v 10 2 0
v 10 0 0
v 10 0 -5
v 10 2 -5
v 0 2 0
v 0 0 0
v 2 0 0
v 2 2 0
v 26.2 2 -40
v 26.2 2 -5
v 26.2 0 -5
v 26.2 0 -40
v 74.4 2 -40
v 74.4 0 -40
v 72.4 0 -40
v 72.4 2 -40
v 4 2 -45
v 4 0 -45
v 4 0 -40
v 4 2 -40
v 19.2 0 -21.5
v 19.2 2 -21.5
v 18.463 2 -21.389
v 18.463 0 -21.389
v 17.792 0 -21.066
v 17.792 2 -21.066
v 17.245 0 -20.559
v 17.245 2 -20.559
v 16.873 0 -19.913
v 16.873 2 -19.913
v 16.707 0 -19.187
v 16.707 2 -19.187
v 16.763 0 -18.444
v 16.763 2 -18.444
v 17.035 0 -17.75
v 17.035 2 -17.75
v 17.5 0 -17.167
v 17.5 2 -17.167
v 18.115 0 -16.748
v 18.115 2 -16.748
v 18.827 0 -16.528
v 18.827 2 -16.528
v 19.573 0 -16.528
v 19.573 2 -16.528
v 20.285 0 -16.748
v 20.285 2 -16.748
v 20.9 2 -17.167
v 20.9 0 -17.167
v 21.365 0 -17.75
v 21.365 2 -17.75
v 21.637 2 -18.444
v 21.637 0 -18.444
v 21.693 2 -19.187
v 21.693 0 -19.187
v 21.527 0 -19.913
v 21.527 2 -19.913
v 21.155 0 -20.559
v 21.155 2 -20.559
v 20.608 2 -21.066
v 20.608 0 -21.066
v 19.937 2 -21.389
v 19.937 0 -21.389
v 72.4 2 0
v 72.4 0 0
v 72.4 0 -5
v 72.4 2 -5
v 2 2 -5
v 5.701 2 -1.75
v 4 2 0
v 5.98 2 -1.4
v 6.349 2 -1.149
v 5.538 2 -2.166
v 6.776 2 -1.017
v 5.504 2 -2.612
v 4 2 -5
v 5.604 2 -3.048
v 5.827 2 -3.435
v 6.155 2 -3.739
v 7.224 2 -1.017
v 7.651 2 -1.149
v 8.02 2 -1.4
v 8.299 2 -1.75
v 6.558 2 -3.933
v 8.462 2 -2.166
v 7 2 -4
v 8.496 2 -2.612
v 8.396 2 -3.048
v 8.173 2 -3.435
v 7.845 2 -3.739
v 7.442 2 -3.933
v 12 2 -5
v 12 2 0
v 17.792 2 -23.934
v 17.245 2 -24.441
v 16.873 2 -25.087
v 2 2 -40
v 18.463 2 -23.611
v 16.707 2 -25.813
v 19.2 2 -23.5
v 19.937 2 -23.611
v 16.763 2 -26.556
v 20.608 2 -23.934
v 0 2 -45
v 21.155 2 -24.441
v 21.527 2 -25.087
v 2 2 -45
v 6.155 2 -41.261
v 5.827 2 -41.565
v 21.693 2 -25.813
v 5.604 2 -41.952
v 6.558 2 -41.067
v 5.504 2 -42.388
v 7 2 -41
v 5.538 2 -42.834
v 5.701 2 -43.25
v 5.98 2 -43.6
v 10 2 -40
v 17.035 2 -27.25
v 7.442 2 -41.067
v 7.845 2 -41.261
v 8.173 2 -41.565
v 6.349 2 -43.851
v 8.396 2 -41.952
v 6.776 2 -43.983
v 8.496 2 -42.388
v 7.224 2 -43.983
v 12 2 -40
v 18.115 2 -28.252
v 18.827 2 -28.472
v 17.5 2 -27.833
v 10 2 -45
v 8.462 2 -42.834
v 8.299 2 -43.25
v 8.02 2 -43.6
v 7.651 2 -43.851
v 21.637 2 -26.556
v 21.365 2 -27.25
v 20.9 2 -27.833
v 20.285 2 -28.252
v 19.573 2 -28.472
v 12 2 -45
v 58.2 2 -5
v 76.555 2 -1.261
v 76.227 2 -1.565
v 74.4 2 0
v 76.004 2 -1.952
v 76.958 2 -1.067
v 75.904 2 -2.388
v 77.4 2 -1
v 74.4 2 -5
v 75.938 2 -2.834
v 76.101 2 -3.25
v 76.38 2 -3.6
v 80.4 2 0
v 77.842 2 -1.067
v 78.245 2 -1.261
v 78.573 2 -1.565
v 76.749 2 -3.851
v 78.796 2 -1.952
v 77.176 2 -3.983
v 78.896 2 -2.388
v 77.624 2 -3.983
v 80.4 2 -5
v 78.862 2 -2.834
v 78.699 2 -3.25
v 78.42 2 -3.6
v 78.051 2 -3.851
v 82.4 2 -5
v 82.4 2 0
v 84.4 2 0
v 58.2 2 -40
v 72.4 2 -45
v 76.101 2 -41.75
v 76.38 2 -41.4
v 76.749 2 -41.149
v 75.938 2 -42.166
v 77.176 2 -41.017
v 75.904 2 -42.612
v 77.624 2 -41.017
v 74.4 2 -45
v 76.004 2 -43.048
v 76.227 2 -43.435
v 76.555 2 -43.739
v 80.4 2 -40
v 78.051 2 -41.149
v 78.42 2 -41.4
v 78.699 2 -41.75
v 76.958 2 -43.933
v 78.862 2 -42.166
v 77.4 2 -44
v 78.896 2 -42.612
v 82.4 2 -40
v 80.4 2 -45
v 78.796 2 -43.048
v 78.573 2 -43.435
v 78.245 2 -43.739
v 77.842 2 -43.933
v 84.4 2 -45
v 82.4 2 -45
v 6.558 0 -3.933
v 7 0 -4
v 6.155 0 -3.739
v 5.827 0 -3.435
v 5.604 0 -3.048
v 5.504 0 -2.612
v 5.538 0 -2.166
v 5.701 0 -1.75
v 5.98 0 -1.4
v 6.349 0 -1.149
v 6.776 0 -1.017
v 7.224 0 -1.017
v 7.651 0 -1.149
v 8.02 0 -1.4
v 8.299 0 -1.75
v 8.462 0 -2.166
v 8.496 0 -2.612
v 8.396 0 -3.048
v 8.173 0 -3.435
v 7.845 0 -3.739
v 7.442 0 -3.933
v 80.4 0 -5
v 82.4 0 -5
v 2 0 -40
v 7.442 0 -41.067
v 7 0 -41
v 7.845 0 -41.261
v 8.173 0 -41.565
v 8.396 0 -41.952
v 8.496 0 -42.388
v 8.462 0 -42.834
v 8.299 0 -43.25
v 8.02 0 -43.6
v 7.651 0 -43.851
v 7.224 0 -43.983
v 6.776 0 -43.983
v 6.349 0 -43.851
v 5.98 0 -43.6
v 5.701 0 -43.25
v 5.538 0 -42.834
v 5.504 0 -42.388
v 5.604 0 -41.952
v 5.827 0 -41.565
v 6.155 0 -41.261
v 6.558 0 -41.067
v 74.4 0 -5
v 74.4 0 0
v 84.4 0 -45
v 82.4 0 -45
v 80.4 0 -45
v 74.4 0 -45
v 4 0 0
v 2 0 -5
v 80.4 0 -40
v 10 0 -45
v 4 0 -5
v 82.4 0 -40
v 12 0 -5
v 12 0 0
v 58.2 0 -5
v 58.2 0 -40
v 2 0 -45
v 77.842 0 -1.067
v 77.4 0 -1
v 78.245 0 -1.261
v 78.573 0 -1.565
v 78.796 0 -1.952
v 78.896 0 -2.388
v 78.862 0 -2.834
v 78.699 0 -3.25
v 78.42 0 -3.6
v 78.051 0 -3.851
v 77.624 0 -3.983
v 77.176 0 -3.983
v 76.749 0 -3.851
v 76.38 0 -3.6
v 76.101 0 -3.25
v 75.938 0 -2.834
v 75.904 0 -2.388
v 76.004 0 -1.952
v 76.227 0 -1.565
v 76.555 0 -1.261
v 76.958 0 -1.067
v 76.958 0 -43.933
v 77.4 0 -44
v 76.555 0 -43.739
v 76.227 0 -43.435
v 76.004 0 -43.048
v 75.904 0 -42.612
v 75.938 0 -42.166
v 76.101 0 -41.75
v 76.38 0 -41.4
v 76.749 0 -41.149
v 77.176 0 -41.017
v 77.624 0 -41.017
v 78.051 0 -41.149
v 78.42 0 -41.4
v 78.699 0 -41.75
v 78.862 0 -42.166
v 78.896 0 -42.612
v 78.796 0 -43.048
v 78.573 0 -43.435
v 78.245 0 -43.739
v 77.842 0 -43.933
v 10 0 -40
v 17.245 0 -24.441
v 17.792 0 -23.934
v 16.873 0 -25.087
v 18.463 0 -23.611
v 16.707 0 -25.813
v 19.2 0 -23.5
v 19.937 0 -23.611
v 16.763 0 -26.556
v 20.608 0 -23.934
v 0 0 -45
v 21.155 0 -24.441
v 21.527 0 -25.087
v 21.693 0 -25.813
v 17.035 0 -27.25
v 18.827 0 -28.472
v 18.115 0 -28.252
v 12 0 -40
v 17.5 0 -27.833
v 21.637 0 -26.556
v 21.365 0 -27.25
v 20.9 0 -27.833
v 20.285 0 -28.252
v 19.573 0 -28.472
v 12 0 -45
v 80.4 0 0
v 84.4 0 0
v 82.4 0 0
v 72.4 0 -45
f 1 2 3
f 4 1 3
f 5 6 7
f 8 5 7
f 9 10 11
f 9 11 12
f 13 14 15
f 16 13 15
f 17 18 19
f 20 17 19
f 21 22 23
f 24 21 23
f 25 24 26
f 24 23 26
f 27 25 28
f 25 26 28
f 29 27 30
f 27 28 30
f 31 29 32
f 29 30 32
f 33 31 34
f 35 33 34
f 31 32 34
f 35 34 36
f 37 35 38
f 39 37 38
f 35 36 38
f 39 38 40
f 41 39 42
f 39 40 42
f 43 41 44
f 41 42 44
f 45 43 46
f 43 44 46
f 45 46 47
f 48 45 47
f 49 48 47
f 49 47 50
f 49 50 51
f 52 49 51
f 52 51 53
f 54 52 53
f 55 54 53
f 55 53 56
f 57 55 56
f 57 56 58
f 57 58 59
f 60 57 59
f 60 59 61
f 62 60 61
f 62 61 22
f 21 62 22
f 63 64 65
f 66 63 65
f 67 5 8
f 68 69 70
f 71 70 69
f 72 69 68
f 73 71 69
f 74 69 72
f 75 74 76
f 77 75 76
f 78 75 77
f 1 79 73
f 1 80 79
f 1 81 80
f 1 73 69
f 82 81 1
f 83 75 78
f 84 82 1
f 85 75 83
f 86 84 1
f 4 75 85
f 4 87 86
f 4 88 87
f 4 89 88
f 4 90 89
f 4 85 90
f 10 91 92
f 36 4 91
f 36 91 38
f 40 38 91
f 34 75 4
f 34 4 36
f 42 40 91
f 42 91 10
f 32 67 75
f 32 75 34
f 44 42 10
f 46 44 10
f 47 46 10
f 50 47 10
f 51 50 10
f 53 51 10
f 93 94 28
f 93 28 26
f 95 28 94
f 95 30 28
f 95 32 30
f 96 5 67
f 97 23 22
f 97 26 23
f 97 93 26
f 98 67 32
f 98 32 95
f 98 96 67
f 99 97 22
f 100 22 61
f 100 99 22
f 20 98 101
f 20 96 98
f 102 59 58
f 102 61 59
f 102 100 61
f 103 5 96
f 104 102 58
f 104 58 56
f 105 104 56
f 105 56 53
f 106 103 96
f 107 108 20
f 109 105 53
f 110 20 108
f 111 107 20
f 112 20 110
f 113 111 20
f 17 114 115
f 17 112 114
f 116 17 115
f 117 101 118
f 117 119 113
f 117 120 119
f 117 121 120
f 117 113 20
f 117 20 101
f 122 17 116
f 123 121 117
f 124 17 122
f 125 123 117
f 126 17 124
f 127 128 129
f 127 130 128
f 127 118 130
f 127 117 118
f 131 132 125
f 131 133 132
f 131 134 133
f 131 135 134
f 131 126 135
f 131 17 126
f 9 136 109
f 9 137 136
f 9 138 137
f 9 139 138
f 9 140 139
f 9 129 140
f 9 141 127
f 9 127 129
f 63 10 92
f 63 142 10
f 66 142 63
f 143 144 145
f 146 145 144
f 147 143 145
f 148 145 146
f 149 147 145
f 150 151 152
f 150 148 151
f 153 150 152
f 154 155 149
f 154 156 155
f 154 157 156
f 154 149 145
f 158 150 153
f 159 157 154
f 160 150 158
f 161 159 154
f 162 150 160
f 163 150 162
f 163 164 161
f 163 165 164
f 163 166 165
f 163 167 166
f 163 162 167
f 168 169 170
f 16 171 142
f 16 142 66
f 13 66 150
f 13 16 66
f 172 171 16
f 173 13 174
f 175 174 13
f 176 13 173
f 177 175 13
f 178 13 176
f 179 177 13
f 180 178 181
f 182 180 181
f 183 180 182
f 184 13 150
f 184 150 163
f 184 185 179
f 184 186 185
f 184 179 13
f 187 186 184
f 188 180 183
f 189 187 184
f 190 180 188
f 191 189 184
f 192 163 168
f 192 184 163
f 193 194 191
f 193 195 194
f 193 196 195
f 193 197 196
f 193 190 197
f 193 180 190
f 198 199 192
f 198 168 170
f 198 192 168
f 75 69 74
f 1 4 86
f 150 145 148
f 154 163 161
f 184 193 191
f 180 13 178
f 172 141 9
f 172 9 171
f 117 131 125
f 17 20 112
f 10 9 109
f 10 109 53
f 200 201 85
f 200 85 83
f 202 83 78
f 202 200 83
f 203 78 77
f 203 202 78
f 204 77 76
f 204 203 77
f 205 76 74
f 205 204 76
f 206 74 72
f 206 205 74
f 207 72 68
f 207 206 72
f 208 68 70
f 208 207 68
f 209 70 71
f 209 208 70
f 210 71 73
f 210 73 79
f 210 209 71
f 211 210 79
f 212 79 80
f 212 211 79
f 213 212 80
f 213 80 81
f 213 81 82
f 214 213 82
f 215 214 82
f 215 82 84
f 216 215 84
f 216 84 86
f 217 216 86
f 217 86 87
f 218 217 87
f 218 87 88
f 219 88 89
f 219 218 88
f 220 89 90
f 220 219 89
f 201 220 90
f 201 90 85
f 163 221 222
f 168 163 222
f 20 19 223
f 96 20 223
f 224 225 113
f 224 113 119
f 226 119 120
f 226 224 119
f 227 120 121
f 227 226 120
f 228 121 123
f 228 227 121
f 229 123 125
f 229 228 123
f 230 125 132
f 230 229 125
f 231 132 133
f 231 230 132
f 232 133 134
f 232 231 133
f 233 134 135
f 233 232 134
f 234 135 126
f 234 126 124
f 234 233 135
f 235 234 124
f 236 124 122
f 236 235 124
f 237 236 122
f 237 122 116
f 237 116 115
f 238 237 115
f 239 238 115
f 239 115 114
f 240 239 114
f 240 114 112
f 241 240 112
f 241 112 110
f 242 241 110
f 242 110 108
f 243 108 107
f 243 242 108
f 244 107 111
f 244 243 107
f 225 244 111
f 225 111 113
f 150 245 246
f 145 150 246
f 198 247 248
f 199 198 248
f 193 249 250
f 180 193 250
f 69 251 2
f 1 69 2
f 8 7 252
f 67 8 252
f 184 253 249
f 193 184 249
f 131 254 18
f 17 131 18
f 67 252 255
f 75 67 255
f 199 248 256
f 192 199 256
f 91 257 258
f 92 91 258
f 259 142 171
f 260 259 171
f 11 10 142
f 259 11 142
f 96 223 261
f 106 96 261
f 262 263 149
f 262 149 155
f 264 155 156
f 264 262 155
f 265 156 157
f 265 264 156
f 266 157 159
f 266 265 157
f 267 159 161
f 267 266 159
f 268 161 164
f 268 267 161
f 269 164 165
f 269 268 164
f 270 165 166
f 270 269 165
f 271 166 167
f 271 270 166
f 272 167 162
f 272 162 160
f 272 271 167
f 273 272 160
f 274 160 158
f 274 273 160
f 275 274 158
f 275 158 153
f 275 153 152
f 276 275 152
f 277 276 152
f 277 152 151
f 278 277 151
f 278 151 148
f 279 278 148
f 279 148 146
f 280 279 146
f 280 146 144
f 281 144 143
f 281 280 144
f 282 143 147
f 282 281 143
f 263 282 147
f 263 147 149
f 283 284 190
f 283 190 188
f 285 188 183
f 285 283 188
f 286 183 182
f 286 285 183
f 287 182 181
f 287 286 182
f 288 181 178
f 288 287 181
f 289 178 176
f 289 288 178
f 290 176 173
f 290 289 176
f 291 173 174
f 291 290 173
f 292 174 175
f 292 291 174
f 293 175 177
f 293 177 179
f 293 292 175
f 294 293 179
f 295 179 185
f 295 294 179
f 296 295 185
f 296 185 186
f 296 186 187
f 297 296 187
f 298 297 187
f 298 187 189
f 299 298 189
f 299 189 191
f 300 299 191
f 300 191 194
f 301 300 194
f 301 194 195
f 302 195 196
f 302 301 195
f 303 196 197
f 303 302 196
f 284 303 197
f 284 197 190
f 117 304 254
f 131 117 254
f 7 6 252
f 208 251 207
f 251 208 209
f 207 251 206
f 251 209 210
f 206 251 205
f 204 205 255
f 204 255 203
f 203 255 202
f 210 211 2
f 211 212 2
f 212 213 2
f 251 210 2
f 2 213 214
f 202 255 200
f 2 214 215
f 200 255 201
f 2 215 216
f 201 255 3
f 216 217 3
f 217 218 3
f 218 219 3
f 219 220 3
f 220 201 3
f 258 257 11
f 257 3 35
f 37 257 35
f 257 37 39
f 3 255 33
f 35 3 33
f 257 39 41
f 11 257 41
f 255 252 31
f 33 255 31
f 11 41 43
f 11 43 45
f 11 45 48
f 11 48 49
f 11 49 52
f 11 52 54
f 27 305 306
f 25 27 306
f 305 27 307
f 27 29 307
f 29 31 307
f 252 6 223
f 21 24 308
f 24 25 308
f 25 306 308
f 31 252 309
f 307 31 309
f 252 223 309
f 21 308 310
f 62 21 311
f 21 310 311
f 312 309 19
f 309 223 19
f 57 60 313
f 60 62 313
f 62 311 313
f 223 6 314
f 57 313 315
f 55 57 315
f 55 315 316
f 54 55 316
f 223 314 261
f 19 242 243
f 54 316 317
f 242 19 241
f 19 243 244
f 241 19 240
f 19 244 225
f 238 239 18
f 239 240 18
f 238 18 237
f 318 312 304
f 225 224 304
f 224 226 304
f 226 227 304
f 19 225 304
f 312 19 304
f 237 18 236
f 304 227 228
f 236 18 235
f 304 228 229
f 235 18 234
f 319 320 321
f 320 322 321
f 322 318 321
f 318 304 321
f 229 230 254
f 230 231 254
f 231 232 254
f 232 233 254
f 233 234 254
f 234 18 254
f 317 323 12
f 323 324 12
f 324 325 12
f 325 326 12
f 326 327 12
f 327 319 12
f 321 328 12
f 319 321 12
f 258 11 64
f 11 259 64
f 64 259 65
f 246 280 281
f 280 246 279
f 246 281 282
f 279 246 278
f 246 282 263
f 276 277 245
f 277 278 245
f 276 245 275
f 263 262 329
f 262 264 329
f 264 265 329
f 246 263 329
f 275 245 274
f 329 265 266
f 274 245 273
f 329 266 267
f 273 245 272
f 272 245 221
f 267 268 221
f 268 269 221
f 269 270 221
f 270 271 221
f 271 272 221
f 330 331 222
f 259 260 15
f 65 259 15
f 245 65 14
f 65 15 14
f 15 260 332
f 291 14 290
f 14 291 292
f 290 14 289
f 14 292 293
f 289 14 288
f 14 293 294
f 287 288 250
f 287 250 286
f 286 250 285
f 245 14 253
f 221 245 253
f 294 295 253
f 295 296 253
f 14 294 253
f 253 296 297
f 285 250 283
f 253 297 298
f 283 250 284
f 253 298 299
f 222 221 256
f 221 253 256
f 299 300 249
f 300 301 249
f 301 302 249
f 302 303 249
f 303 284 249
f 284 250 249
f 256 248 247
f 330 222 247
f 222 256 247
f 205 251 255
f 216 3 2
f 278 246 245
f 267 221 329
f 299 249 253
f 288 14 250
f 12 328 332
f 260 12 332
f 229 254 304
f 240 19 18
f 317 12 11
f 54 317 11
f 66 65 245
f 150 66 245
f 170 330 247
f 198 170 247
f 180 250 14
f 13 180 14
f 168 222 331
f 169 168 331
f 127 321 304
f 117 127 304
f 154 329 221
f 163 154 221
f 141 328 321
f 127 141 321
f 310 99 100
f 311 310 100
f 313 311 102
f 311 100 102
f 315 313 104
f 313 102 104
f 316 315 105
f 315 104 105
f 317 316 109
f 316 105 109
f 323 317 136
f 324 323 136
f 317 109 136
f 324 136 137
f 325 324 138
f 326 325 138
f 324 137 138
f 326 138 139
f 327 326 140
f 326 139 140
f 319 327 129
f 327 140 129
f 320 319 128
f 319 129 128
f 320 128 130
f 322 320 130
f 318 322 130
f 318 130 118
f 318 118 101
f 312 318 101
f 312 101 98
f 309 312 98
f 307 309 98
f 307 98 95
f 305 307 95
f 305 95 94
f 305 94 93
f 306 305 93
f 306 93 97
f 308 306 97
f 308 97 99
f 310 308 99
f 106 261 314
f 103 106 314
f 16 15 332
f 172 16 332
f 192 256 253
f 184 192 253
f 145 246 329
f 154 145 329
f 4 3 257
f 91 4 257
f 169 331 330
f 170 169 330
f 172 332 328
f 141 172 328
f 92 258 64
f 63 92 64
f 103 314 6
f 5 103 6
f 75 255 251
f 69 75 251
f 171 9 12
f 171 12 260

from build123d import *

# Parameters (mm, degrees)
SKETCH1_R           = 1.5
BOSS_EXTRUDE1_DEPTH = 2
SKETCH2_W           = 32
SKETCH2_H           = 35
CUT_EXTRUDE1_DEPTH  = 10
SKETCH3_R           = 2.5
CUT_EXTRUDE2_DEPTH  = 10


with BuildPart() as part:
    # Sketch1 → Boss-Extrude1 (new body)
    with BuildSketch(Plane(origin=(0, 0, 0), x_dir=(1, 0, 0), z_dir=(0, 1, 0))):
        Polygon((0, 0), (2, 0), (2, 5), (4, 5), (4, 0), (10, 0), (10, 5), (12, 5), (12, 0), (72.4, 0), (72.4, 5), (74.4, 5), (74.4, 0), (80.4, 0), (80.4, 5), (82.4, 5), (82.4, 0), (84.4, 0), (84.4, 45), (82.4, 45), (82.4, 40), (80.4, 40), (80.4, 45), (74.4, 45), (74.4, 40), (72.4, 40), (72.4, 45), (12, 45), (12, 40), (10, 40), (10, 45), (4, 45), (4, 40), (2, 40), (2, 45), (0, 45), align=None)
        with Locations(Location((7, 42.5, 0), (0, 0, 270))):
            Circle(SKETCH1_R, mode=Mode.SUBTRACT)
        with Locations(Location((77.4, 42.5, 0), (0, 0, 90))):
            Circle(SKETCH1_R, mode=Mode.SUBTRACT)
        with Locations(Location((7, 2.5, 0), (0, 0, 90))):
            Circle(SKETCH1_R, mode=Mode.SUBTRACT)
        with Locations(Location((77.4, 2.5, 0), (0, 0, 270))):
            Circle(SKETCH1_R, mode=Mode.SUBTRACT)
    extrude(amount=BOSS_EXTRUDE1_DEPTH)

    # Sketch2 → Cut-Extrude1 (cut)
    with BuildSketch(Plane(origin=(0, 2, 0), x_dir=(1, 0, 0), z_dir=(0, 1, 0))):
        with Locations((42.2, 22.5)):
            Rectangle(SKETCH2_W, SKETCH2_H)
    extrude(amount=-CUT_EXTRUDE1_DEPTH, mode=Mode.SUBTRACT)

    # Sketch3 → Cut-Extrude2 (cut)
    with BuildSketch(Plane(origin=(0, 2, 0), x_dir=(1, 0, 0), z_dir=(0, 1, 0))):
        with Locations(Location((19.2, 26, 0), (0, 0, 270))):
            Circle(SKETCH3_R)
        with Locations(Location((19.2, 19, 0), (0, 0, 90))):
            Circle(SKETCH3_R)
    extrude(amount=-CUT_EXTRUDE2_DEPTH, mode=Mode.SUBTRACT)


solid = part.part
